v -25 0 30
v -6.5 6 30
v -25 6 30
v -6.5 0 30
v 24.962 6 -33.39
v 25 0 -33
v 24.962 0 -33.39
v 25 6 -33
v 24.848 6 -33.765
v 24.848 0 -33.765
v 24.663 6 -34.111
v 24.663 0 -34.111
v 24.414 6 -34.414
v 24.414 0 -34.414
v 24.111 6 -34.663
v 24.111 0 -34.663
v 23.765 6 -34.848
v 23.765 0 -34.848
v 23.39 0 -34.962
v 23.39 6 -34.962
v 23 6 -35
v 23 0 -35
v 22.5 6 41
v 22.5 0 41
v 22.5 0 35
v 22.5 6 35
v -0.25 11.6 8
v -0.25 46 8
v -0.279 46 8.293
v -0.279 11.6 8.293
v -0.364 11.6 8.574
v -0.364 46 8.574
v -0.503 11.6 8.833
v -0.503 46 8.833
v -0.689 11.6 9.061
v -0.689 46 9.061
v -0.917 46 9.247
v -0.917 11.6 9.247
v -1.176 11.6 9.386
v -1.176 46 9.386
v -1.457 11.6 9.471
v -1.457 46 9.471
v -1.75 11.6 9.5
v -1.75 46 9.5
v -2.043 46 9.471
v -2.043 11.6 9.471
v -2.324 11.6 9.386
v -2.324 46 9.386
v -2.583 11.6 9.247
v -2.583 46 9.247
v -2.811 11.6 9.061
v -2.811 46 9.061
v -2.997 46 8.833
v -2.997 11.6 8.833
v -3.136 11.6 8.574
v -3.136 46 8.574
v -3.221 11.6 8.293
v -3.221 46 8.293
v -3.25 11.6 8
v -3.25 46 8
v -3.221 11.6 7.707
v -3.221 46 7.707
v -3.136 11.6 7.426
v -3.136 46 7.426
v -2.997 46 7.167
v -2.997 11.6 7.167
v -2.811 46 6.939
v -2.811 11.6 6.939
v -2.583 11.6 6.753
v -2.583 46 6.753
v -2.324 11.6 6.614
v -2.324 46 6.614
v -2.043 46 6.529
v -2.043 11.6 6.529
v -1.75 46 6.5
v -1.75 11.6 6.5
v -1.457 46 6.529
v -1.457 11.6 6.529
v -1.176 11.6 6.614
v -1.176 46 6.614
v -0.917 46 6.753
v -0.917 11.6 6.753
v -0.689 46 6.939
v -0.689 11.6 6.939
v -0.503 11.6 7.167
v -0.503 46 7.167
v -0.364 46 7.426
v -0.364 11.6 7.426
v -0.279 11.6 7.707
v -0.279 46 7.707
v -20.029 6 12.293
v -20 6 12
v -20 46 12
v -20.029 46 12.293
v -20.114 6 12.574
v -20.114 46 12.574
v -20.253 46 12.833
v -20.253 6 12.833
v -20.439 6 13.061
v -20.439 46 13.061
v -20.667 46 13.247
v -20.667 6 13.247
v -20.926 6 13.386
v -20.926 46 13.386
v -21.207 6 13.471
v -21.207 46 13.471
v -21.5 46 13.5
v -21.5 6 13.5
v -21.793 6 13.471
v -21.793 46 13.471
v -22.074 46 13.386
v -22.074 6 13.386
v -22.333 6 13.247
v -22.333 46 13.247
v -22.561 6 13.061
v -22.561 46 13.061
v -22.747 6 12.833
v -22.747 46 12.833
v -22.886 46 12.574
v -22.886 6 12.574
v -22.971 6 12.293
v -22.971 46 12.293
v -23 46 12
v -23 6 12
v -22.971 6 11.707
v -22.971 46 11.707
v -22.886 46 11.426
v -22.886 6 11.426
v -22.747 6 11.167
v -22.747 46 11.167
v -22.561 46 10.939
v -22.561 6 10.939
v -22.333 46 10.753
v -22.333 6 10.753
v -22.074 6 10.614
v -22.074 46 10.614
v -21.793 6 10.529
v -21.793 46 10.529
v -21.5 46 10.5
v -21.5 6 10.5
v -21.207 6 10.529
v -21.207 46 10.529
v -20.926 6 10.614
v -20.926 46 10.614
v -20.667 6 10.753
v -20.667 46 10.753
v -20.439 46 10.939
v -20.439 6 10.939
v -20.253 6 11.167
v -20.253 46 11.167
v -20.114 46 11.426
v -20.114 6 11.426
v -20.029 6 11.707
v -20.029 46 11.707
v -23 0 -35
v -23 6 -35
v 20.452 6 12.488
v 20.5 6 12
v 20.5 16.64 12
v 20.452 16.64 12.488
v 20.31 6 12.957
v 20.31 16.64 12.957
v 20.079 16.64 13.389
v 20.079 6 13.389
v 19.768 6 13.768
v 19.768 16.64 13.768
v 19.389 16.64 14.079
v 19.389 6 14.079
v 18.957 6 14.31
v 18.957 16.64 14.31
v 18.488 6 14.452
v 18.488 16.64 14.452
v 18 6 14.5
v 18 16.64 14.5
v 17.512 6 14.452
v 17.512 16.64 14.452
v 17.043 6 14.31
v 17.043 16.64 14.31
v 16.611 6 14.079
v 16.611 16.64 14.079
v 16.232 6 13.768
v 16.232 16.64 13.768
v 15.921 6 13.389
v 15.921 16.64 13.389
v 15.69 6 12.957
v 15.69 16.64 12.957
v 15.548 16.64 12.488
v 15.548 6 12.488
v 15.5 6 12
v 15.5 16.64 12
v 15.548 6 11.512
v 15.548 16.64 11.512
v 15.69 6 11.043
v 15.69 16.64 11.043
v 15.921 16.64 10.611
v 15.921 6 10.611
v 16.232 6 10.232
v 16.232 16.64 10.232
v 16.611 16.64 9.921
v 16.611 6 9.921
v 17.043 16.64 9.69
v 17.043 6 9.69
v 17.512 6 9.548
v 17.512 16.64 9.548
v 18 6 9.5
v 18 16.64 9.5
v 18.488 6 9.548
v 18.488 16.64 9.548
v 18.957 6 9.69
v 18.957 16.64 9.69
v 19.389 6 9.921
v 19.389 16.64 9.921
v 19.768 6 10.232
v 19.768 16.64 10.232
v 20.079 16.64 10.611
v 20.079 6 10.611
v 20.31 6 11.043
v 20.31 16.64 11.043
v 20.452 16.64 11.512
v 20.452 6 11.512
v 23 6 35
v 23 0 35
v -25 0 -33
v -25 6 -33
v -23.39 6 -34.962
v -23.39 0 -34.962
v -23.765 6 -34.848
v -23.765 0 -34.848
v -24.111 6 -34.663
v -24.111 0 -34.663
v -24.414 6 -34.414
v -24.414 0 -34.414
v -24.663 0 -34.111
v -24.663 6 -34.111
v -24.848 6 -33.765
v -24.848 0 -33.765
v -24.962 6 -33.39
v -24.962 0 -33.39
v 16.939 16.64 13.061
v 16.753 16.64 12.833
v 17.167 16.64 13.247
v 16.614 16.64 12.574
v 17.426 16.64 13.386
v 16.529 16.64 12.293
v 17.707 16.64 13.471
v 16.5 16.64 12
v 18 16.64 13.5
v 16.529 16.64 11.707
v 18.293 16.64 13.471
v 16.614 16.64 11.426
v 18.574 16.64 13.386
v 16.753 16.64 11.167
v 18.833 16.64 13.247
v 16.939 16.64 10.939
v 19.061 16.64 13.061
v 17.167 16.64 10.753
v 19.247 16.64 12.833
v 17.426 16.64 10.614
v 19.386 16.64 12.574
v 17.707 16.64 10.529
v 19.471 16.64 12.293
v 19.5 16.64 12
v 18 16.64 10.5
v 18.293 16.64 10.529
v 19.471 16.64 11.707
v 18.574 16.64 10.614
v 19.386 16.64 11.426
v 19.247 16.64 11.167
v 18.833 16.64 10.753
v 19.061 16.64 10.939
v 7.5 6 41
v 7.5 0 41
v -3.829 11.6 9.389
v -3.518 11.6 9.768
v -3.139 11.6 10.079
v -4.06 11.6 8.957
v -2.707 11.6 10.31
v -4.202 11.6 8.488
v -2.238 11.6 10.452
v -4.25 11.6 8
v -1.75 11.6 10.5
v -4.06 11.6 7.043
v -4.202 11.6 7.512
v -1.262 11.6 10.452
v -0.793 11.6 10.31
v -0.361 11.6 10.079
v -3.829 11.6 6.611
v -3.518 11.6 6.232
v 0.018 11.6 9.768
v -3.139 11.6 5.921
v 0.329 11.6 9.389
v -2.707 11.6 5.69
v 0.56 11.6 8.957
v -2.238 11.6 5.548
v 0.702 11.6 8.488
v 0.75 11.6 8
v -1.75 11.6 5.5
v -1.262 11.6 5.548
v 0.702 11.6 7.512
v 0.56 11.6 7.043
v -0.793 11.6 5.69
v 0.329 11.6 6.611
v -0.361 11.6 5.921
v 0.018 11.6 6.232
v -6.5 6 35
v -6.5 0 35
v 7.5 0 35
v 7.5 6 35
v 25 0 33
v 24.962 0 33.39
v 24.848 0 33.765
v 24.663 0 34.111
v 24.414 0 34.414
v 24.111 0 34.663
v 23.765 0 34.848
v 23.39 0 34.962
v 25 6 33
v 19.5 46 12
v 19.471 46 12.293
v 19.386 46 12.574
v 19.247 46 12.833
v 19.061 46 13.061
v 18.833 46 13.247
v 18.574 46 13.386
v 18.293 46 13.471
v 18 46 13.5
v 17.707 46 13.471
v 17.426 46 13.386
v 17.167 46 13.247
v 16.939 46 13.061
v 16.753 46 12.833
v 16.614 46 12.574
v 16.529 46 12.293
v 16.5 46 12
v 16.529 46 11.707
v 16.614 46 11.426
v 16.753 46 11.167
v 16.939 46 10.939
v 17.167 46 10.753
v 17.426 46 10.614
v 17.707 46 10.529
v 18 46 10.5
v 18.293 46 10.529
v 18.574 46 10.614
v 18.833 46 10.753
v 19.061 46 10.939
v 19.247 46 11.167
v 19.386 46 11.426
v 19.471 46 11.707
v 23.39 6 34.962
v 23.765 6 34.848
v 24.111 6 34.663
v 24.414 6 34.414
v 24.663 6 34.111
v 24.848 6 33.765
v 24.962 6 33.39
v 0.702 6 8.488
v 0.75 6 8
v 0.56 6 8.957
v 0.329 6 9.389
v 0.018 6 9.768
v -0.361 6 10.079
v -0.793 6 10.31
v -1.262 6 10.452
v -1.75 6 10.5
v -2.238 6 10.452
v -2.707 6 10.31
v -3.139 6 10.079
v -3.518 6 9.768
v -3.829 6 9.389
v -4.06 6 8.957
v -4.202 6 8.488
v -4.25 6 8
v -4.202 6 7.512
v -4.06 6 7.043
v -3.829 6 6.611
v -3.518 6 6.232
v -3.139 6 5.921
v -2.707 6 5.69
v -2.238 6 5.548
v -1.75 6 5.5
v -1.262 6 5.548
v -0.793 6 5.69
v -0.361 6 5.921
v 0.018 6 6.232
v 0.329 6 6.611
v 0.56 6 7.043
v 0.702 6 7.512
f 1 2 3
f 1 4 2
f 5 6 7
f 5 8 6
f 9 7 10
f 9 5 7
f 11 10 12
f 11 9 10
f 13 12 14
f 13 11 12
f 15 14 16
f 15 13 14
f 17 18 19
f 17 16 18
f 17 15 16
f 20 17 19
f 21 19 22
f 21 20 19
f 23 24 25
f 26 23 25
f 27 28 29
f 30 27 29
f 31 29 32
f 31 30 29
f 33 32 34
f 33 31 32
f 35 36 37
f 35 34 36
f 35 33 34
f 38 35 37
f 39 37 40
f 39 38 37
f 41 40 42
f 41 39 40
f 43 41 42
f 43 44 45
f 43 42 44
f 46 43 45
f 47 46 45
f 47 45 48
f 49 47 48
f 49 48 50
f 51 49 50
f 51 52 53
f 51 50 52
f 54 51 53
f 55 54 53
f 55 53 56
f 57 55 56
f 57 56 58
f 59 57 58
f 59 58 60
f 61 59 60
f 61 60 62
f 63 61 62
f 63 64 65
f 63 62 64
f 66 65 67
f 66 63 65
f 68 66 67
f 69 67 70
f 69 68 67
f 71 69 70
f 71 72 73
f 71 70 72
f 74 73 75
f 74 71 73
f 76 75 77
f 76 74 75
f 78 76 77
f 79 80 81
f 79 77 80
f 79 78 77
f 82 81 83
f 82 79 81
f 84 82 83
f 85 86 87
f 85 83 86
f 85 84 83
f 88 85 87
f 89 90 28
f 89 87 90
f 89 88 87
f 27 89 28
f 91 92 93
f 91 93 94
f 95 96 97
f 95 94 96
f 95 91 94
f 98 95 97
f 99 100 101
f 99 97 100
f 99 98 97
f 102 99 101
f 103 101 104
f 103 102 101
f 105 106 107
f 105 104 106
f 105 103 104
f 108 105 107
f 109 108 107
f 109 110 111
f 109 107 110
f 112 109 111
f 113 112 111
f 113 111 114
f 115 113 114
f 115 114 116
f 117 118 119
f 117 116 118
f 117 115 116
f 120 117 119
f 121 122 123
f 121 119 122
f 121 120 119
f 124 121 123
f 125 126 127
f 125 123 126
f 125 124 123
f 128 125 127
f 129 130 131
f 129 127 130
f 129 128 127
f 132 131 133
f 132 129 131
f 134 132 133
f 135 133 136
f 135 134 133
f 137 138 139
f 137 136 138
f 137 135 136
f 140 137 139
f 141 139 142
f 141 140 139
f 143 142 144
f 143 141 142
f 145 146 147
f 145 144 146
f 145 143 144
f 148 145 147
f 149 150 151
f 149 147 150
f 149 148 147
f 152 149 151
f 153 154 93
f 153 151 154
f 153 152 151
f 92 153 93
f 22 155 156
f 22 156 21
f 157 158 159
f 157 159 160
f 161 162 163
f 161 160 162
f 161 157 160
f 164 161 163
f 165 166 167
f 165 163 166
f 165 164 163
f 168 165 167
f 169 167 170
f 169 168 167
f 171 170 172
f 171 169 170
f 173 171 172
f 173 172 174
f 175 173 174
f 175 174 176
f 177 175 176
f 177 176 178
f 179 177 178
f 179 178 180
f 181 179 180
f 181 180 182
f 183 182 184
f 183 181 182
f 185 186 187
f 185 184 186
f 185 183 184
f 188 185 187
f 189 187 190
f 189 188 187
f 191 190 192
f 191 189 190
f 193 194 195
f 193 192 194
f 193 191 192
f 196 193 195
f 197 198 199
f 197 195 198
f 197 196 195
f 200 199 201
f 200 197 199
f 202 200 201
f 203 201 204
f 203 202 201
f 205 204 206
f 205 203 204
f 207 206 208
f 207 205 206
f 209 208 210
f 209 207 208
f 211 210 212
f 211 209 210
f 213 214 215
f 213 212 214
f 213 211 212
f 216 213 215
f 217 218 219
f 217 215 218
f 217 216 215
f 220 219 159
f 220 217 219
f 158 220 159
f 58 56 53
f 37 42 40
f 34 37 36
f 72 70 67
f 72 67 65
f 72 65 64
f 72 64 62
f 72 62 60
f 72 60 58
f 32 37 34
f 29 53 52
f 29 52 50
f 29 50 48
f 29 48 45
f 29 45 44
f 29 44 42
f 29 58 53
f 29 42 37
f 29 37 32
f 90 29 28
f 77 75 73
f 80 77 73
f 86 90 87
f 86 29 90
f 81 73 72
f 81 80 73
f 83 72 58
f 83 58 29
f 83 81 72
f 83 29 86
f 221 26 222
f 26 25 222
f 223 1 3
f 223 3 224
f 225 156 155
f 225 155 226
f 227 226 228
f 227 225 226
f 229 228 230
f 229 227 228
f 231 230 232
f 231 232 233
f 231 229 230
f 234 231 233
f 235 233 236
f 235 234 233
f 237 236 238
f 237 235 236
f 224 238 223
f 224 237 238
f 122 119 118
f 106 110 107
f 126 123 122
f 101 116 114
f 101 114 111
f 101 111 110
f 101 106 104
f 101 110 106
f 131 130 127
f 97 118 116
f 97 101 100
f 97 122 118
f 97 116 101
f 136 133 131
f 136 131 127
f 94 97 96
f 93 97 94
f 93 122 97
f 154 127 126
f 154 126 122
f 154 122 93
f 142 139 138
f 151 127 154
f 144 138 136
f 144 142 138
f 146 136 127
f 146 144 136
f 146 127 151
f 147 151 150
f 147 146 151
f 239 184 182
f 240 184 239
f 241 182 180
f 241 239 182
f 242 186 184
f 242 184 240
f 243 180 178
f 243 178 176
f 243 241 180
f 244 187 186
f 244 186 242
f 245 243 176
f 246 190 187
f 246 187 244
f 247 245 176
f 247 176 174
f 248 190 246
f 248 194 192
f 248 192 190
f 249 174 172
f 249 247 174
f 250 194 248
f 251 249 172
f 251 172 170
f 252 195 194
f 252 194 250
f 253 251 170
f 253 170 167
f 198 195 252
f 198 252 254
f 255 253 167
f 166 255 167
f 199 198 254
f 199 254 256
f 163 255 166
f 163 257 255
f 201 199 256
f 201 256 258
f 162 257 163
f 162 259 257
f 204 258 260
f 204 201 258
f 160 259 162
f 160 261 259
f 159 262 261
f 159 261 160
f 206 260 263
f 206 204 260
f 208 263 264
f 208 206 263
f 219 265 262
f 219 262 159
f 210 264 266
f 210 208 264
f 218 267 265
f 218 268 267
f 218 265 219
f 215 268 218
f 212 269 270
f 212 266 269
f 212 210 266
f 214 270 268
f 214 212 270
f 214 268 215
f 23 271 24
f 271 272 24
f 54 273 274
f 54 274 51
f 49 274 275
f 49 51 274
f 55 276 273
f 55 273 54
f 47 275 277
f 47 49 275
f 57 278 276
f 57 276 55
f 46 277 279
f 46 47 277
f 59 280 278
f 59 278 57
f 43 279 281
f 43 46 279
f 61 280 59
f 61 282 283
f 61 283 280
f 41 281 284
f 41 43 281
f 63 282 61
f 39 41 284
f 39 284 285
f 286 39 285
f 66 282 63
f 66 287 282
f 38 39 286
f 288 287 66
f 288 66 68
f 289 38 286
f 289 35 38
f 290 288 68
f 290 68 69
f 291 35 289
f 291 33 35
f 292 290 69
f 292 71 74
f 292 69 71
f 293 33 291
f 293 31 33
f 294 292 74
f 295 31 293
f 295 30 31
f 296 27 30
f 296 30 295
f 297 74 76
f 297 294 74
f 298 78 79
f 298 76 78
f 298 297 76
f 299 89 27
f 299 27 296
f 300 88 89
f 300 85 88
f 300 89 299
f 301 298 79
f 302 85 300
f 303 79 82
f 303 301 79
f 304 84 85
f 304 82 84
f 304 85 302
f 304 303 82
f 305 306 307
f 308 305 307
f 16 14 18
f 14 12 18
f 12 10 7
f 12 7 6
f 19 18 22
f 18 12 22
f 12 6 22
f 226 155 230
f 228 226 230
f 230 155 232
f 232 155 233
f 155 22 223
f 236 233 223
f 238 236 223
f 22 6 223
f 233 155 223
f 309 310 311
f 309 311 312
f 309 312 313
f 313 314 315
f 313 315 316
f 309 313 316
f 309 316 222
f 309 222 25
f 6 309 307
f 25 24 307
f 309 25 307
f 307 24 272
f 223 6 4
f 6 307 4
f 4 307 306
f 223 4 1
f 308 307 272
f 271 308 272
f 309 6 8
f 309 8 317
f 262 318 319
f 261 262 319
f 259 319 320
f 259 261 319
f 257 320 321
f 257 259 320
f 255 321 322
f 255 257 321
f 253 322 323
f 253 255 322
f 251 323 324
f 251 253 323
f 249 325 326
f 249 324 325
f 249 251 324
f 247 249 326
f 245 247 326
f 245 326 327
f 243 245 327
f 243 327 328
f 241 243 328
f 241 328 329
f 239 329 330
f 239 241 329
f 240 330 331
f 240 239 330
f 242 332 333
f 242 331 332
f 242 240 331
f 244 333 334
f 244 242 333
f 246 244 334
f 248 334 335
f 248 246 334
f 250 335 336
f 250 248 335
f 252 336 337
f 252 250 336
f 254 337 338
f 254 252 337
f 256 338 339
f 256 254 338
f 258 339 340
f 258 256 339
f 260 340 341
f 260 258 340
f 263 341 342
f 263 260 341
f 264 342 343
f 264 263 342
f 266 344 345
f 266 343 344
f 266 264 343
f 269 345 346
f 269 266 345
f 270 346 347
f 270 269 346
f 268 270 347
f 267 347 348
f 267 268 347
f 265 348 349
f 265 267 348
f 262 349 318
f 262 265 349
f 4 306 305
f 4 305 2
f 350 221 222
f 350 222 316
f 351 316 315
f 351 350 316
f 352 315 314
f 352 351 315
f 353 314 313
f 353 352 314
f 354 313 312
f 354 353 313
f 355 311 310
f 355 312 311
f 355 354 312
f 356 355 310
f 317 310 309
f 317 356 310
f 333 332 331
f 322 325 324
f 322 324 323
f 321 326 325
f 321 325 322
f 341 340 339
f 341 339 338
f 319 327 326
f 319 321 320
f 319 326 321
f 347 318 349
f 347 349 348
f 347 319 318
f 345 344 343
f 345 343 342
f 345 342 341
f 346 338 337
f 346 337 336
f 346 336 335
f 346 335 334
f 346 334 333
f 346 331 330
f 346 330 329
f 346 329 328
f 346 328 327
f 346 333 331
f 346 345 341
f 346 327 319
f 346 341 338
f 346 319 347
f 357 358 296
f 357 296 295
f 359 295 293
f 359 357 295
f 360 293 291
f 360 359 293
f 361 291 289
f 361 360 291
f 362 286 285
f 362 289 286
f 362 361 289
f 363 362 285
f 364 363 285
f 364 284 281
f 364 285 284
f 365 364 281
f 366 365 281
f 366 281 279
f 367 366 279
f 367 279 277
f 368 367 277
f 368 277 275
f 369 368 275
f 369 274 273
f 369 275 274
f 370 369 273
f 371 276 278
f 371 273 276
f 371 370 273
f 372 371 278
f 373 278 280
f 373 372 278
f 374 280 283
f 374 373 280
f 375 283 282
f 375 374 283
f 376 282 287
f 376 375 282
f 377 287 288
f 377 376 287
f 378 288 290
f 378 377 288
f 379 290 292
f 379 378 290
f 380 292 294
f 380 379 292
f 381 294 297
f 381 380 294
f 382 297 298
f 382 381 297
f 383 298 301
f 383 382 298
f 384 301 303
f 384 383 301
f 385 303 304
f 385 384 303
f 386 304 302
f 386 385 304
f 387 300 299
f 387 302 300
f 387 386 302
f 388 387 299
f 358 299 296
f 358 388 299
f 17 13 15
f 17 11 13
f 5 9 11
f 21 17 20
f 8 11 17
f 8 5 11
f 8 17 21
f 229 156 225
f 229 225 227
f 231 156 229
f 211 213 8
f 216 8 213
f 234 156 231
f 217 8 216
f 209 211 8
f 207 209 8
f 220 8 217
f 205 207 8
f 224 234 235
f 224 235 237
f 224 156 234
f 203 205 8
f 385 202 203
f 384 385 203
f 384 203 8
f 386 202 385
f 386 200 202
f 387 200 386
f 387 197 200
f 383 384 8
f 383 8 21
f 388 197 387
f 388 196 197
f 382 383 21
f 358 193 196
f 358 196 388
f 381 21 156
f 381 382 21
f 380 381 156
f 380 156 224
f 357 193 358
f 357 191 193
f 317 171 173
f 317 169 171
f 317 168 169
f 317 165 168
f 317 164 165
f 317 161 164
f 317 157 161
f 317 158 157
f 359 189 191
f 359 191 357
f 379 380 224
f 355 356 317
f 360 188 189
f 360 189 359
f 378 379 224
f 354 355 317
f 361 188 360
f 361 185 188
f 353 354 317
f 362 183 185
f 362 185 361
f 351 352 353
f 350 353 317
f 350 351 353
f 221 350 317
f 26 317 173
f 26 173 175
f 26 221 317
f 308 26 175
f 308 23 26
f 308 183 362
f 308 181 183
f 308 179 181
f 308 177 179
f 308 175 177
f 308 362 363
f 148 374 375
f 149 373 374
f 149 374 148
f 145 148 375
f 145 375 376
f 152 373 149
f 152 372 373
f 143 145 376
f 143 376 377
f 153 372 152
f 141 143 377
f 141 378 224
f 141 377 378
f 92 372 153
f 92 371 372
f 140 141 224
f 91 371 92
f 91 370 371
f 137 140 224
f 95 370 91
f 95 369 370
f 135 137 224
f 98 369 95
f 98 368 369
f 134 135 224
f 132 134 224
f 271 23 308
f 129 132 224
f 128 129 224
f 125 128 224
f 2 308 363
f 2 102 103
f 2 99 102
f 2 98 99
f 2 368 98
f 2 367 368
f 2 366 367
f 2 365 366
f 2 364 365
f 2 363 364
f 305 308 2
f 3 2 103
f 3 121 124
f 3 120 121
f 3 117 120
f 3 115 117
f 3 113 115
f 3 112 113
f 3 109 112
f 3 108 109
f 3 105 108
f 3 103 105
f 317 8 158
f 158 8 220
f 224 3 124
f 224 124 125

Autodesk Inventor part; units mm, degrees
ref_plane "YZ Plane" through (0, 0, 0) normal (1, 0, 0) x (0, 1, 0)
ref_plane "XZ Plane" through (0, 0, 0) normal (0, 1, 0) x (-1, 0, 0)
ref_plane "XY Plane" through (0, 0, 0) normal (0, 0, 1) x (1, 0, 0)
sketch "Sketch2" plane through (0, 0, 0) normal (0, 1, 0) x (-1, 0, 0)
  line L0 (25, -35) -> (-25, -35)
  line L1 (-25, -35) -> (-25, 35)
  line L2 (25, 30) -> (25, -35)
  line L3 (25, -35) -> (-25, 35) construction
  line L4 (-25, -35) -> (25, 35) construction
  line L5 (12, 35) -> (-3, 35)
  line L6 (6.5, 35) -> (12, 35)
  line L7 (-3, 35) -> (-25, 35)
  line L8 (25, 35) -> (6.5, 35)
  line L9 (6.5, 35) -> (6.5, 30)
  line L10 (6.5, 30) -> (25, 30)
  line L11 (25, 30) -> (25, 35)
  line L12 (-22.5, 35) -> (-7.5, 35)
  line L13 (-7.5, 35) -> (-7.5, 41)
  line L14 (-7.5, 41) -> (-22.5, 41)
  line L15 (-22.5, 41) -> (-22.5, 35)
  point P0 (0, 0)
  point P1 (0, 0)
  point P2 (-7.5, 35)
  dimension "d0" = 50
  dimension "d1" = 70
  dimension "d16" = 18.5
  dimension "d17" = 5
  dimension "d58" = 2.5
  dimension "d59" = 15
  dimension "d60" = 6
extrude "Extrusion3" add sketch "Sketch2" along normal blind 6 contours L0 L1 L7 L5 L9 L10 L2 | L15 L14 L13 L7
fillet "Fillet1" radius 2 3 edges at (25, 3, -35) (-25, 3, -35) (25, 3, 35)
sketch "Sketch4" plane through (0, 6, 0) normal (0, 1, 0) x (1, 0, 0)
  circle A0 centre (-1.75, -8) radius 2.5
  line L0 (25, -33) -> (25, 33) projected
  circle A1 centre (-21.5, -12) radius 1.5
  line L1 (-25, 33) -> (-25, -30) projected
  circle A2 centre (18, -12) radius 2.5
  line L2 (-6.5, -35) -> (7.5, -35) projected
  point P0 (0, 0)
  dimension "d31" = 5
  dimension "d34" = 3
  dimension "d41" = 5
  dimension "d44" = 19.75
  dimension "d45" = 19.75
  dimension "d46" = 7
  dimension "d61" = 23
  dimension "d62" = 27
  dimension "d63" = 23
extrude "Extrusion5" add sketch "Sketch4" along normal blind 40 contours A1
extrude "Extrusion6" add sketch "Sketch4" along normal blind 5.6 contours A0
sketch "Sketch5" plane through (-1.75, 11.6, 8) normal (0, 1, 0) x (1, 0, 0)
  circle A0 centre (0, 0) radius 1.5
  point P0 (1.75, 8)
  dimension "d50" = 3
extrude "Extrusion7" add sketch "Sketch5" along normal blind 34.4
extrude "Extrusion8" add sketch "Sketch4" along normal blind 10.64 contours A2
sketch "Sketch6" plane through (18, 16.64, 12) normal (0, 1, 0) x (1, 0, 0)
  circle A0 centre (0, 0) radius 1.5
  point P0 (-18, 12)
  dimension "d55" = 3
extrude "Extrusion9" add sketch "Sketch6" along normal blind 29.36
properties part number "Pared_caja_reduccion"
